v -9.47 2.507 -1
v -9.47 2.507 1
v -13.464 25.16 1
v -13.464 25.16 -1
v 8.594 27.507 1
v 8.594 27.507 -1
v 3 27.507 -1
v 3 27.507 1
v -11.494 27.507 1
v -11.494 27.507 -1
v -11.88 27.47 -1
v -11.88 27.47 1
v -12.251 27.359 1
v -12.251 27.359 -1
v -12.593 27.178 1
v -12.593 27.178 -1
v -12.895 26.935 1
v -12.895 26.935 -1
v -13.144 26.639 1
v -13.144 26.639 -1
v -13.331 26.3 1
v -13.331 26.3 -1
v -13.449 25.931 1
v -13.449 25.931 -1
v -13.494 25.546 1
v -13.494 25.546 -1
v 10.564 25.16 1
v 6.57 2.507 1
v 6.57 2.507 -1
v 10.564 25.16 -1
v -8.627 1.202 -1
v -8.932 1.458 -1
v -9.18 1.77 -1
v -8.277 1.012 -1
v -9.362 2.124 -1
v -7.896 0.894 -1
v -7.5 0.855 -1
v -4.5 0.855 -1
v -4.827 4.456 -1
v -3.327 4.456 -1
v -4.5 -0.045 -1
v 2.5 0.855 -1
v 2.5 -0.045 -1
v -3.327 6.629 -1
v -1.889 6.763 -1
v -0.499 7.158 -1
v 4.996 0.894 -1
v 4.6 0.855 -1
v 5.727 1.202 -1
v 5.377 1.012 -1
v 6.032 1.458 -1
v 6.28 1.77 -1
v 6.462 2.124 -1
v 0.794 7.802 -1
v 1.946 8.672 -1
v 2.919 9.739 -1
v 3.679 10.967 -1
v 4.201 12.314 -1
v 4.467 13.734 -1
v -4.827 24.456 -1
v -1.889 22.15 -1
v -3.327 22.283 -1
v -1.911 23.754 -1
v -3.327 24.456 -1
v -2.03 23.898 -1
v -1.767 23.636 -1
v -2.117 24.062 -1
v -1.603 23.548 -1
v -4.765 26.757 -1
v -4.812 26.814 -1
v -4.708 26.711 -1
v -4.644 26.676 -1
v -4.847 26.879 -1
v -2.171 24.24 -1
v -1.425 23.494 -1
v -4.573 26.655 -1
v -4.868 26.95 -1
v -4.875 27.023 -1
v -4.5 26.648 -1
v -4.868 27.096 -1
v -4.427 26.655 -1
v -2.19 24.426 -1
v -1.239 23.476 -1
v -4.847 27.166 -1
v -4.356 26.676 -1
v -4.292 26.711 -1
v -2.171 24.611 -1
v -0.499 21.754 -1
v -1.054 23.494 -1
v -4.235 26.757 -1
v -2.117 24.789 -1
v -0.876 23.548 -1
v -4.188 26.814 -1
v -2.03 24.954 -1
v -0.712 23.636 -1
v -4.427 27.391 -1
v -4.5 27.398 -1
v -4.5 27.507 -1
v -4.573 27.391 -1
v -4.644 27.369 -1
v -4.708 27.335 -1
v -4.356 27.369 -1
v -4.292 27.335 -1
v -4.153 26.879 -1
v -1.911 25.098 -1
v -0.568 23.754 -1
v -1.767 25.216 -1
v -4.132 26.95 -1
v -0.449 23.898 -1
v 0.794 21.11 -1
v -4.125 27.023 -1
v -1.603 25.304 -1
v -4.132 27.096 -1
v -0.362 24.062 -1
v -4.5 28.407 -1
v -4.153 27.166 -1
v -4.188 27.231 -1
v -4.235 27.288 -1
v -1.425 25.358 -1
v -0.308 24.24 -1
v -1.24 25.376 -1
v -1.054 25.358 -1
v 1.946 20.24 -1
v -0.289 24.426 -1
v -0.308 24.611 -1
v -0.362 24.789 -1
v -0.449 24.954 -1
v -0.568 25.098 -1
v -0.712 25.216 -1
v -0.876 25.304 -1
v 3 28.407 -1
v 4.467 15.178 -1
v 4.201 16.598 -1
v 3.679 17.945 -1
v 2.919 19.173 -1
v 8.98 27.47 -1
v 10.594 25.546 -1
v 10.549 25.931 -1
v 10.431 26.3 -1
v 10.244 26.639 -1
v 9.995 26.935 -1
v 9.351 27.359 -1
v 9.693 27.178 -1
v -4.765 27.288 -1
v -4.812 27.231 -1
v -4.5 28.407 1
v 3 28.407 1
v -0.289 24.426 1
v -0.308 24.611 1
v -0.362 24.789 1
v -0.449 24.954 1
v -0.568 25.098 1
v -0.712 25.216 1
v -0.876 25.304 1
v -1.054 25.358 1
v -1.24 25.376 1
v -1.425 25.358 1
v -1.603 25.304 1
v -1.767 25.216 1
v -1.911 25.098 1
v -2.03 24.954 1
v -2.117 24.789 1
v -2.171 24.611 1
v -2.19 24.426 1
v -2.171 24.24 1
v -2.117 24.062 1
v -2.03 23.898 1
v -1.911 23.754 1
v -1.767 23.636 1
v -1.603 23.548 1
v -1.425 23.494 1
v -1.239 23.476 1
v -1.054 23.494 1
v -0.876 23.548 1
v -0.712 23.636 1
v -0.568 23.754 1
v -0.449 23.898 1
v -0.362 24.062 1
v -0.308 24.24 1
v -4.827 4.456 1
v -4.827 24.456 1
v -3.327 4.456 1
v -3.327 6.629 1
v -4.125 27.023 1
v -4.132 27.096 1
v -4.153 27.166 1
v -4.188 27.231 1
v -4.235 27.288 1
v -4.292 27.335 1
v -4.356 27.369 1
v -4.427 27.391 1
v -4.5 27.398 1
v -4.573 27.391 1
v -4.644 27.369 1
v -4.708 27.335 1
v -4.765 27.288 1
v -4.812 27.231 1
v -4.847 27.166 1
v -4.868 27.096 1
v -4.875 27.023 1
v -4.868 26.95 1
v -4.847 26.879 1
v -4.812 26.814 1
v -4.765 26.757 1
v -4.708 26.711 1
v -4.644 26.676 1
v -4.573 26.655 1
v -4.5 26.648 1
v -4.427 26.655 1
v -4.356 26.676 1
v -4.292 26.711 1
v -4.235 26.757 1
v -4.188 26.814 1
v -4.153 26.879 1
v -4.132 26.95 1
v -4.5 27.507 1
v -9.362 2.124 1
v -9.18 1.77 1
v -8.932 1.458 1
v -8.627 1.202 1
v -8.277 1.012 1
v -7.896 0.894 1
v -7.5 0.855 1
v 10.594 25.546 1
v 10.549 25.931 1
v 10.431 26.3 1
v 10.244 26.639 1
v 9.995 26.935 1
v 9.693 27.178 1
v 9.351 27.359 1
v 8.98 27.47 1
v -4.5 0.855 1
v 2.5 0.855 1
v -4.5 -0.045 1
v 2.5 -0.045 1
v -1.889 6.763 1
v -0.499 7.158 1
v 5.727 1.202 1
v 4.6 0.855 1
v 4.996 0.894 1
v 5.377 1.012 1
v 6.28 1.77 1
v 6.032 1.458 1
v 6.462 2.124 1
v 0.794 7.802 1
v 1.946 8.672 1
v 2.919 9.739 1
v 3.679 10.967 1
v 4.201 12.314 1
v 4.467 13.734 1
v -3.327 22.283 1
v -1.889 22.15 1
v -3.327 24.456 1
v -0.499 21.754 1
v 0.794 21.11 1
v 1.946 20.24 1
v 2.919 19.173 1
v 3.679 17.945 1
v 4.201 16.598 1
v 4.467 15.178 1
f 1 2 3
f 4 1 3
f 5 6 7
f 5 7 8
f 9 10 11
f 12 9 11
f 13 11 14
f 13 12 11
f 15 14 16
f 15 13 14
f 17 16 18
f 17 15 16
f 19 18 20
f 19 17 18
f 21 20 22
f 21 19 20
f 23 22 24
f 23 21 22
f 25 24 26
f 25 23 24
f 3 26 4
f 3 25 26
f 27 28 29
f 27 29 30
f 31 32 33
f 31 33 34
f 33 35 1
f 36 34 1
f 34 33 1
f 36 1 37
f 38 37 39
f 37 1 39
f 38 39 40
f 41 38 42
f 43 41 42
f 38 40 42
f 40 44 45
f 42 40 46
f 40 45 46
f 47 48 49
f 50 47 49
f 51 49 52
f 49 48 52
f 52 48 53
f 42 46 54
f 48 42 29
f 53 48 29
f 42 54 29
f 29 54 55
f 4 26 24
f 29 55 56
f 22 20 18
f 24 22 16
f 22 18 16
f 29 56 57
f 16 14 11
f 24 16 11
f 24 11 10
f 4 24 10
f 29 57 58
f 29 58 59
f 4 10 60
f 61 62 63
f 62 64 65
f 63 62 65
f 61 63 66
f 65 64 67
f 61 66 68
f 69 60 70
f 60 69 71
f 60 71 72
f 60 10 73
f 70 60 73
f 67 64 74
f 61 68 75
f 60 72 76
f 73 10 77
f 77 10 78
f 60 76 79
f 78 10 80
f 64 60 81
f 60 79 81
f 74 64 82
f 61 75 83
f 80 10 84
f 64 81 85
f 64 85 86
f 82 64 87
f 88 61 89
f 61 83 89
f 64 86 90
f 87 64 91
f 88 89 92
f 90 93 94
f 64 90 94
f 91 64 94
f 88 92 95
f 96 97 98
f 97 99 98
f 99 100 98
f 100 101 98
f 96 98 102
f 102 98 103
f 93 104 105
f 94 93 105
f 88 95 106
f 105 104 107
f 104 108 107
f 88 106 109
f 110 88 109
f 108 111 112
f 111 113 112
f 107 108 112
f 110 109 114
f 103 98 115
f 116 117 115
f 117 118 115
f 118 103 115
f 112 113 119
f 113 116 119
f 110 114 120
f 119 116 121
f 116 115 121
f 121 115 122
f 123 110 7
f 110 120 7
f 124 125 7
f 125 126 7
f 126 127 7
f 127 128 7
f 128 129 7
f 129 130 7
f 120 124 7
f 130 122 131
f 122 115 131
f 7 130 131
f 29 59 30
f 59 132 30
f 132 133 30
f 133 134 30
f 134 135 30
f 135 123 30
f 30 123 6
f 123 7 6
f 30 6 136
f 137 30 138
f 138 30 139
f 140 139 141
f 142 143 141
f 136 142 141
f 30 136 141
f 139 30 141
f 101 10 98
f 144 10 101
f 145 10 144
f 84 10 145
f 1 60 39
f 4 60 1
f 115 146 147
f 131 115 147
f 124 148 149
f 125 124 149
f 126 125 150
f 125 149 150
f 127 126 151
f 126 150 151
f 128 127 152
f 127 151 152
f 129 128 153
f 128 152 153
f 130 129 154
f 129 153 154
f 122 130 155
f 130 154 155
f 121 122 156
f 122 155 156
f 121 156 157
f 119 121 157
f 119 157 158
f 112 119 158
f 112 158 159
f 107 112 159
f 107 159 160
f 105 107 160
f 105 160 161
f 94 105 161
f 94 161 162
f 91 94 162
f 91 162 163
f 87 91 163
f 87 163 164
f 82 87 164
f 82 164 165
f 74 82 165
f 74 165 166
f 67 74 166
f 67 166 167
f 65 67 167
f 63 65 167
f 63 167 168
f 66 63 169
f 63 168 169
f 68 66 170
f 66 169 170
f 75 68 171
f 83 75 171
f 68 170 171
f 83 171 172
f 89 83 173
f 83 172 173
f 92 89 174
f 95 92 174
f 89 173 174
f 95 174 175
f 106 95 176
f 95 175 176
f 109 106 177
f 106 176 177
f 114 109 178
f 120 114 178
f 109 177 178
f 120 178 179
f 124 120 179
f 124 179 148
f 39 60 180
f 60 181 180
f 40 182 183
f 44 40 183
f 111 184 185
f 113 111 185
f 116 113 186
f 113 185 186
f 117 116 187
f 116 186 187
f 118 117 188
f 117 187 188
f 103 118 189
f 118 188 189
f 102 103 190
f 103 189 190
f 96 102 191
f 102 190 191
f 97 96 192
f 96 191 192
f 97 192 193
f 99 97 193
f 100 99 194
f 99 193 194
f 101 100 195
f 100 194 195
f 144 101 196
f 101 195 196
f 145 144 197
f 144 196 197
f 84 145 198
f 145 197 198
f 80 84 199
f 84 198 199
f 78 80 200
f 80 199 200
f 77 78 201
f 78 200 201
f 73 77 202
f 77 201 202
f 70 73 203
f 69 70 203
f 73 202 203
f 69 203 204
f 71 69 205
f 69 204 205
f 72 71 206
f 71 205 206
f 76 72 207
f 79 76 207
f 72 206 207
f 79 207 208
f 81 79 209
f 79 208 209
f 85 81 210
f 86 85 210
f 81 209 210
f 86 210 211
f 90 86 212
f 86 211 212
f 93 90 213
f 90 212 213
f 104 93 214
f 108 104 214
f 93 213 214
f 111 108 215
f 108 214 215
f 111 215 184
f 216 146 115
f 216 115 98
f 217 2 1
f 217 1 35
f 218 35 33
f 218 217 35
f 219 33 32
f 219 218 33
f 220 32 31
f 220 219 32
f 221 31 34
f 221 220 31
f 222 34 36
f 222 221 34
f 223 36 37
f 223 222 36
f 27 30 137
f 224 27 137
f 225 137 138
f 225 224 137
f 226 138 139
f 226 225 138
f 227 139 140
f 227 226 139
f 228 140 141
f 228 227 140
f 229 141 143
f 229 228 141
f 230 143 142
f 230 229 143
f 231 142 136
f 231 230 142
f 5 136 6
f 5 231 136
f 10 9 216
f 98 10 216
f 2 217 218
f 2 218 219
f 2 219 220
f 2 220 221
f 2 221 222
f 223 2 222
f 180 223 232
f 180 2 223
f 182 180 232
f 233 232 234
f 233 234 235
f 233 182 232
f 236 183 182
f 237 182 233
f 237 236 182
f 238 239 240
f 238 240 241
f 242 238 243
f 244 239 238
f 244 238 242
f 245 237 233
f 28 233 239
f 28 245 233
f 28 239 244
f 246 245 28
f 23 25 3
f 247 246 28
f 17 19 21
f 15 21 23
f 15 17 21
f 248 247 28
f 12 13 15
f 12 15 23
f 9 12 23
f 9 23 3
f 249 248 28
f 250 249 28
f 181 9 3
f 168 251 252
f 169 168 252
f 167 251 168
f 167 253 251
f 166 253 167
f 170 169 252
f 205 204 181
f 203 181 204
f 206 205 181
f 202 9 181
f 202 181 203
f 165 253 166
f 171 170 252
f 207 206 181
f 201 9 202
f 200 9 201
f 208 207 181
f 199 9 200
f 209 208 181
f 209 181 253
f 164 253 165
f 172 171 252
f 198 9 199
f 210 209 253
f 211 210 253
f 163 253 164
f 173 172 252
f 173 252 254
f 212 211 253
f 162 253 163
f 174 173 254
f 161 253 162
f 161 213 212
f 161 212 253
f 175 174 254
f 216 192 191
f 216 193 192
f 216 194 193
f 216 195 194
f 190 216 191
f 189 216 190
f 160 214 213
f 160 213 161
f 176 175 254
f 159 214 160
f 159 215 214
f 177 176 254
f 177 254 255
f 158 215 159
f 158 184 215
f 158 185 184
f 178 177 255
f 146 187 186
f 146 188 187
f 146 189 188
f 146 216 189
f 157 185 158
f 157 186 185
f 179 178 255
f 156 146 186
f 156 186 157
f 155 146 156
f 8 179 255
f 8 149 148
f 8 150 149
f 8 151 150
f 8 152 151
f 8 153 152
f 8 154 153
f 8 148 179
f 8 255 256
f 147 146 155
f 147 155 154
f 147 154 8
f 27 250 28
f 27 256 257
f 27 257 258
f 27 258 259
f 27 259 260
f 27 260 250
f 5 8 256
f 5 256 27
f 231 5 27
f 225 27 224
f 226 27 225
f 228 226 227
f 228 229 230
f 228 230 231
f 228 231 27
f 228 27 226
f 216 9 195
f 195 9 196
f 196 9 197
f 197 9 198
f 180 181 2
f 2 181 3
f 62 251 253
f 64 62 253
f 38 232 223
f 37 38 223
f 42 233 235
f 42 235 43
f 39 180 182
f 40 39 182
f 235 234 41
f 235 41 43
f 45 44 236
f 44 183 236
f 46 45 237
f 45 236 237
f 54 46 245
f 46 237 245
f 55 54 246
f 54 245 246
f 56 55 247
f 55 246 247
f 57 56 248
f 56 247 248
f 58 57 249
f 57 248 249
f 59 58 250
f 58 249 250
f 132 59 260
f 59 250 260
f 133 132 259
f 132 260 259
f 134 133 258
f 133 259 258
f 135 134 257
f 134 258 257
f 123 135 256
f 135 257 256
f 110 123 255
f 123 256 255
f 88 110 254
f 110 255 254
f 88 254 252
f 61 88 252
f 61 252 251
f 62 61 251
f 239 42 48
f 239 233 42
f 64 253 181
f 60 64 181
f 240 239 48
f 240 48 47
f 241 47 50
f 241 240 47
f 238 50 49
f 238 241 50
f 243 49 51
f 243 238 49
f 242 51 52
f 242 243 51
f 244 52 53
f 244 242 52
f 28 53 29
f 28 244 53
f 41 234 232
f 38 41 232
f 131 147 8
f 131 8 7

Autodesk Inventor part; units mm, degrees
ref_plane "YZ Plane" through (0, 0, 0) normal (1, 0, 0) x (0, 1, 0)
ref_plane "XZ Plane" through (0, 0, 0) normal (0, 1, 0) x (-1, 0, 0)
ref_plane "XY Plane" through (0, 0, 0) normal (0, 0, 1) x (1, 0, 0)
sketch "Sketch1" plane through (0, 0, 0) normal (0, 0, 1) x (1, 0, 0)
  line L0 (-4.5, -0.0453) -> (4.5, -0.0453)
  line L1 (4.5, -0.0453) -> (4.5, 0.8547)
  line L2 (4.5, 0.8547) -> (4.6, 0.8547)
  line L3 (6.5696, 2.5074) -> (10.5639, 25.1601)
  arc A0 (4.6, 0.8547) -> (6.5696, 2.5074) centre (4.6, 2.8547) ccw
  line L4 (-4.5, -0.0453) -> (-4.5, 0.8547)
  line L5 (-4.5, 0.8547) -> (-7.5, 0.8547)
  line L6 (-9.4696, 2.5074) -> (-13.4639, 25.1601)
  arc A1 (-9.4696, 2.5074) -> (-7.5, 0.8547) centre (-7.5, 2.8547) ccw
  line L7 (10.9778, 27.5074) -> (-13.8778, 27.5074) construction
  line L8 (-4.5, -0.7454) -> (-4.5, 29.497) construction
  line L9 (-4.5, 31.0971) -> (4.5, 31.0971) construction
  line L10 (4.5, 31.0971) -> (4.5, 0.8547) construction
  line L11 (8.5943, 27.5074) -> (4.5, 27.5074)
  line L12 (-11.4943, 27.5074) -> (-4.5, 27.5074)
  line L13 (4.5, 27.5074) -> (4.5, 28.4074)
  line L14 (-4.5, 28.4074) -> (-4.5, 27.5074)
  line L15 (-4.5, 28.4074) -> (4.5, 28.4074)
  arc A2 (10.5639, 25.1601) -> (8.5943, 27.5074) centre (8.5943, 25.5074) ccw
  arc A3 (-11.4943, 27.5074) -> (-13.4639, 25.1601) centre (-11.4943, 25.5074) ccw
  arc A4 (-3.3267, 6.6293) -> (-3.3267, 22.2828) centre (-3.3267, 14.456) ccw
  line L16 (-3.3267, 24.456) -> (-3.3267, 14.456)
  line L17 (-3.3267, 14.456) -> (-3.3267, 4.456)
  line L18 (-3.3267, 4.456) -> (-4.5, 4.456)
  line L19 (-3.3267, 24.456) -> (-4.5, 24.456)
  line L20 (-4.5, 4.4448) -> (-4.5, 24.4448)
  circle A5 centre (7.1554, 22.5114) radius 0.4516
  circle A6 centre (-1.2395, 24.4257) radius 0.9502
  circle A7 centre (-4.5, 27.0227) radius 0.3751
  point P0 (0, 0)
  dimension "d1" = 2
  dimension "d2" = 100
  dimension "d3" = 25
  dimension "d4" = 0.1
  dimension "d5" = 2
  dimension "d6" = 3
  dimension "d7" = 4.5
  dimension "d8" = 4.5
  dimension "d9" = 100
  dimension "d10" = 25
  dimension "d11" = 0.9
  dimension "d12" = 0.9
  dimension "d13" = 2
  dimension "d16" = 10
  dimension "d17" = 10
extrude "Extrusion1" add sketch "Sketch1" along normal mid plane 2 contours L4 L5 A1 L6 A3 L12 L14 L15 L13 L11 A2 L3 A0 L2 L1 L0 | L17 L16 A4 | A5 | A6 | A7
extrude "Extrusion2" cut sketch "Sketch1" against normal through all contours L17 L16 A4
extrude "Extrusion3" cut sketch "Sketch1" along normal through all both and the other way through all contours L17 L16 A4
extrude "Extrusion6" cut sketch "Sketch1" against normal through all both and the other way through all contours A6
extrude "Extrusion7" cut sketch "Sketch1" against normal through all both and the other way through all contours A7
sketch "Esboço2" plane through (4.5, -0.0453, 1) normal (1, 0, 0) x (0, 0, -1)
  line L0 (0, 0.9) -> (2, 0.9) projected
  line L1 (0, 0.9) -> (2, 0.9)
  line L2 (2, 0) -> (0, 0) projected
  line L3 (2, 0.9) -> (2, 0)
  line L4 (2, 0) -> (0, 0)
  line L5 (0, 0) -> (0, 0.9) projected
  line L6 (0, 0) -> (0, 0.9)
  point P0 (1, 0.0453)
extrude "Extrusão8" cut sketch "Esboço2" against normal blind 2
sketch "Esboço3" plane through (4.5, 27.5074, 1) normal (1, 0, 0) x (0, 0, -1)
  line L0 (2, 0.9) -> (0, 0.9) projected
  line L1 (0, 0.9) -> (2, 0.9)
  line L2 (2, 0) -> (0, 0) projected
  line L3 (2, 0.9) -> (2, 0)
  line L4 (2, 0) -> (0, 0)
  line L5 (0, 0.9) -> (0, 0) projected
  line L6 (0, 0) -> (0, 0.9)
  point P0 (1, -27.5074)
extrude "Extrusão9" cut sketch "Esboço3" against normal blind 1.5
sketch "Esboço4" plane through (0, 0, 1) normal (0, 0, 1) x (1, 0, 0)
  line L0 (-3.3267, 22.2828) -> (-3.3267, 6.6293) projected
  line L1 (-3.3267, 22.2828) -> (-3.3267, 24.456)
  line L2 (-3.3267, 24.456) -> (-4.8267, 24.456)
  line L3 (-4.8267, 24.456) -> (-4.8267, 4.456)
  line L4 (-4.8267, 4.456) -> (-3.3267, 4.456)
  line L5 (-3.3267, 4.456) -> (-3.3267, 6.6293)
  arc A0 (-3.3267, 6.6293) -> (-3.3267, 22.2828) centre (-3.3267, 14.456) ccw projected
  point P0 (0, 0)
  dimension "d36" = 20
  dimension "d37" = 1.5
  dimension "d38" = 10
extrude "Extrusão10" cut sketch "Esboço4" against normal blind 10 contours L0 L5 L4 L3 L2 L1
properties material "Liga de Nickel-Copper 400"
